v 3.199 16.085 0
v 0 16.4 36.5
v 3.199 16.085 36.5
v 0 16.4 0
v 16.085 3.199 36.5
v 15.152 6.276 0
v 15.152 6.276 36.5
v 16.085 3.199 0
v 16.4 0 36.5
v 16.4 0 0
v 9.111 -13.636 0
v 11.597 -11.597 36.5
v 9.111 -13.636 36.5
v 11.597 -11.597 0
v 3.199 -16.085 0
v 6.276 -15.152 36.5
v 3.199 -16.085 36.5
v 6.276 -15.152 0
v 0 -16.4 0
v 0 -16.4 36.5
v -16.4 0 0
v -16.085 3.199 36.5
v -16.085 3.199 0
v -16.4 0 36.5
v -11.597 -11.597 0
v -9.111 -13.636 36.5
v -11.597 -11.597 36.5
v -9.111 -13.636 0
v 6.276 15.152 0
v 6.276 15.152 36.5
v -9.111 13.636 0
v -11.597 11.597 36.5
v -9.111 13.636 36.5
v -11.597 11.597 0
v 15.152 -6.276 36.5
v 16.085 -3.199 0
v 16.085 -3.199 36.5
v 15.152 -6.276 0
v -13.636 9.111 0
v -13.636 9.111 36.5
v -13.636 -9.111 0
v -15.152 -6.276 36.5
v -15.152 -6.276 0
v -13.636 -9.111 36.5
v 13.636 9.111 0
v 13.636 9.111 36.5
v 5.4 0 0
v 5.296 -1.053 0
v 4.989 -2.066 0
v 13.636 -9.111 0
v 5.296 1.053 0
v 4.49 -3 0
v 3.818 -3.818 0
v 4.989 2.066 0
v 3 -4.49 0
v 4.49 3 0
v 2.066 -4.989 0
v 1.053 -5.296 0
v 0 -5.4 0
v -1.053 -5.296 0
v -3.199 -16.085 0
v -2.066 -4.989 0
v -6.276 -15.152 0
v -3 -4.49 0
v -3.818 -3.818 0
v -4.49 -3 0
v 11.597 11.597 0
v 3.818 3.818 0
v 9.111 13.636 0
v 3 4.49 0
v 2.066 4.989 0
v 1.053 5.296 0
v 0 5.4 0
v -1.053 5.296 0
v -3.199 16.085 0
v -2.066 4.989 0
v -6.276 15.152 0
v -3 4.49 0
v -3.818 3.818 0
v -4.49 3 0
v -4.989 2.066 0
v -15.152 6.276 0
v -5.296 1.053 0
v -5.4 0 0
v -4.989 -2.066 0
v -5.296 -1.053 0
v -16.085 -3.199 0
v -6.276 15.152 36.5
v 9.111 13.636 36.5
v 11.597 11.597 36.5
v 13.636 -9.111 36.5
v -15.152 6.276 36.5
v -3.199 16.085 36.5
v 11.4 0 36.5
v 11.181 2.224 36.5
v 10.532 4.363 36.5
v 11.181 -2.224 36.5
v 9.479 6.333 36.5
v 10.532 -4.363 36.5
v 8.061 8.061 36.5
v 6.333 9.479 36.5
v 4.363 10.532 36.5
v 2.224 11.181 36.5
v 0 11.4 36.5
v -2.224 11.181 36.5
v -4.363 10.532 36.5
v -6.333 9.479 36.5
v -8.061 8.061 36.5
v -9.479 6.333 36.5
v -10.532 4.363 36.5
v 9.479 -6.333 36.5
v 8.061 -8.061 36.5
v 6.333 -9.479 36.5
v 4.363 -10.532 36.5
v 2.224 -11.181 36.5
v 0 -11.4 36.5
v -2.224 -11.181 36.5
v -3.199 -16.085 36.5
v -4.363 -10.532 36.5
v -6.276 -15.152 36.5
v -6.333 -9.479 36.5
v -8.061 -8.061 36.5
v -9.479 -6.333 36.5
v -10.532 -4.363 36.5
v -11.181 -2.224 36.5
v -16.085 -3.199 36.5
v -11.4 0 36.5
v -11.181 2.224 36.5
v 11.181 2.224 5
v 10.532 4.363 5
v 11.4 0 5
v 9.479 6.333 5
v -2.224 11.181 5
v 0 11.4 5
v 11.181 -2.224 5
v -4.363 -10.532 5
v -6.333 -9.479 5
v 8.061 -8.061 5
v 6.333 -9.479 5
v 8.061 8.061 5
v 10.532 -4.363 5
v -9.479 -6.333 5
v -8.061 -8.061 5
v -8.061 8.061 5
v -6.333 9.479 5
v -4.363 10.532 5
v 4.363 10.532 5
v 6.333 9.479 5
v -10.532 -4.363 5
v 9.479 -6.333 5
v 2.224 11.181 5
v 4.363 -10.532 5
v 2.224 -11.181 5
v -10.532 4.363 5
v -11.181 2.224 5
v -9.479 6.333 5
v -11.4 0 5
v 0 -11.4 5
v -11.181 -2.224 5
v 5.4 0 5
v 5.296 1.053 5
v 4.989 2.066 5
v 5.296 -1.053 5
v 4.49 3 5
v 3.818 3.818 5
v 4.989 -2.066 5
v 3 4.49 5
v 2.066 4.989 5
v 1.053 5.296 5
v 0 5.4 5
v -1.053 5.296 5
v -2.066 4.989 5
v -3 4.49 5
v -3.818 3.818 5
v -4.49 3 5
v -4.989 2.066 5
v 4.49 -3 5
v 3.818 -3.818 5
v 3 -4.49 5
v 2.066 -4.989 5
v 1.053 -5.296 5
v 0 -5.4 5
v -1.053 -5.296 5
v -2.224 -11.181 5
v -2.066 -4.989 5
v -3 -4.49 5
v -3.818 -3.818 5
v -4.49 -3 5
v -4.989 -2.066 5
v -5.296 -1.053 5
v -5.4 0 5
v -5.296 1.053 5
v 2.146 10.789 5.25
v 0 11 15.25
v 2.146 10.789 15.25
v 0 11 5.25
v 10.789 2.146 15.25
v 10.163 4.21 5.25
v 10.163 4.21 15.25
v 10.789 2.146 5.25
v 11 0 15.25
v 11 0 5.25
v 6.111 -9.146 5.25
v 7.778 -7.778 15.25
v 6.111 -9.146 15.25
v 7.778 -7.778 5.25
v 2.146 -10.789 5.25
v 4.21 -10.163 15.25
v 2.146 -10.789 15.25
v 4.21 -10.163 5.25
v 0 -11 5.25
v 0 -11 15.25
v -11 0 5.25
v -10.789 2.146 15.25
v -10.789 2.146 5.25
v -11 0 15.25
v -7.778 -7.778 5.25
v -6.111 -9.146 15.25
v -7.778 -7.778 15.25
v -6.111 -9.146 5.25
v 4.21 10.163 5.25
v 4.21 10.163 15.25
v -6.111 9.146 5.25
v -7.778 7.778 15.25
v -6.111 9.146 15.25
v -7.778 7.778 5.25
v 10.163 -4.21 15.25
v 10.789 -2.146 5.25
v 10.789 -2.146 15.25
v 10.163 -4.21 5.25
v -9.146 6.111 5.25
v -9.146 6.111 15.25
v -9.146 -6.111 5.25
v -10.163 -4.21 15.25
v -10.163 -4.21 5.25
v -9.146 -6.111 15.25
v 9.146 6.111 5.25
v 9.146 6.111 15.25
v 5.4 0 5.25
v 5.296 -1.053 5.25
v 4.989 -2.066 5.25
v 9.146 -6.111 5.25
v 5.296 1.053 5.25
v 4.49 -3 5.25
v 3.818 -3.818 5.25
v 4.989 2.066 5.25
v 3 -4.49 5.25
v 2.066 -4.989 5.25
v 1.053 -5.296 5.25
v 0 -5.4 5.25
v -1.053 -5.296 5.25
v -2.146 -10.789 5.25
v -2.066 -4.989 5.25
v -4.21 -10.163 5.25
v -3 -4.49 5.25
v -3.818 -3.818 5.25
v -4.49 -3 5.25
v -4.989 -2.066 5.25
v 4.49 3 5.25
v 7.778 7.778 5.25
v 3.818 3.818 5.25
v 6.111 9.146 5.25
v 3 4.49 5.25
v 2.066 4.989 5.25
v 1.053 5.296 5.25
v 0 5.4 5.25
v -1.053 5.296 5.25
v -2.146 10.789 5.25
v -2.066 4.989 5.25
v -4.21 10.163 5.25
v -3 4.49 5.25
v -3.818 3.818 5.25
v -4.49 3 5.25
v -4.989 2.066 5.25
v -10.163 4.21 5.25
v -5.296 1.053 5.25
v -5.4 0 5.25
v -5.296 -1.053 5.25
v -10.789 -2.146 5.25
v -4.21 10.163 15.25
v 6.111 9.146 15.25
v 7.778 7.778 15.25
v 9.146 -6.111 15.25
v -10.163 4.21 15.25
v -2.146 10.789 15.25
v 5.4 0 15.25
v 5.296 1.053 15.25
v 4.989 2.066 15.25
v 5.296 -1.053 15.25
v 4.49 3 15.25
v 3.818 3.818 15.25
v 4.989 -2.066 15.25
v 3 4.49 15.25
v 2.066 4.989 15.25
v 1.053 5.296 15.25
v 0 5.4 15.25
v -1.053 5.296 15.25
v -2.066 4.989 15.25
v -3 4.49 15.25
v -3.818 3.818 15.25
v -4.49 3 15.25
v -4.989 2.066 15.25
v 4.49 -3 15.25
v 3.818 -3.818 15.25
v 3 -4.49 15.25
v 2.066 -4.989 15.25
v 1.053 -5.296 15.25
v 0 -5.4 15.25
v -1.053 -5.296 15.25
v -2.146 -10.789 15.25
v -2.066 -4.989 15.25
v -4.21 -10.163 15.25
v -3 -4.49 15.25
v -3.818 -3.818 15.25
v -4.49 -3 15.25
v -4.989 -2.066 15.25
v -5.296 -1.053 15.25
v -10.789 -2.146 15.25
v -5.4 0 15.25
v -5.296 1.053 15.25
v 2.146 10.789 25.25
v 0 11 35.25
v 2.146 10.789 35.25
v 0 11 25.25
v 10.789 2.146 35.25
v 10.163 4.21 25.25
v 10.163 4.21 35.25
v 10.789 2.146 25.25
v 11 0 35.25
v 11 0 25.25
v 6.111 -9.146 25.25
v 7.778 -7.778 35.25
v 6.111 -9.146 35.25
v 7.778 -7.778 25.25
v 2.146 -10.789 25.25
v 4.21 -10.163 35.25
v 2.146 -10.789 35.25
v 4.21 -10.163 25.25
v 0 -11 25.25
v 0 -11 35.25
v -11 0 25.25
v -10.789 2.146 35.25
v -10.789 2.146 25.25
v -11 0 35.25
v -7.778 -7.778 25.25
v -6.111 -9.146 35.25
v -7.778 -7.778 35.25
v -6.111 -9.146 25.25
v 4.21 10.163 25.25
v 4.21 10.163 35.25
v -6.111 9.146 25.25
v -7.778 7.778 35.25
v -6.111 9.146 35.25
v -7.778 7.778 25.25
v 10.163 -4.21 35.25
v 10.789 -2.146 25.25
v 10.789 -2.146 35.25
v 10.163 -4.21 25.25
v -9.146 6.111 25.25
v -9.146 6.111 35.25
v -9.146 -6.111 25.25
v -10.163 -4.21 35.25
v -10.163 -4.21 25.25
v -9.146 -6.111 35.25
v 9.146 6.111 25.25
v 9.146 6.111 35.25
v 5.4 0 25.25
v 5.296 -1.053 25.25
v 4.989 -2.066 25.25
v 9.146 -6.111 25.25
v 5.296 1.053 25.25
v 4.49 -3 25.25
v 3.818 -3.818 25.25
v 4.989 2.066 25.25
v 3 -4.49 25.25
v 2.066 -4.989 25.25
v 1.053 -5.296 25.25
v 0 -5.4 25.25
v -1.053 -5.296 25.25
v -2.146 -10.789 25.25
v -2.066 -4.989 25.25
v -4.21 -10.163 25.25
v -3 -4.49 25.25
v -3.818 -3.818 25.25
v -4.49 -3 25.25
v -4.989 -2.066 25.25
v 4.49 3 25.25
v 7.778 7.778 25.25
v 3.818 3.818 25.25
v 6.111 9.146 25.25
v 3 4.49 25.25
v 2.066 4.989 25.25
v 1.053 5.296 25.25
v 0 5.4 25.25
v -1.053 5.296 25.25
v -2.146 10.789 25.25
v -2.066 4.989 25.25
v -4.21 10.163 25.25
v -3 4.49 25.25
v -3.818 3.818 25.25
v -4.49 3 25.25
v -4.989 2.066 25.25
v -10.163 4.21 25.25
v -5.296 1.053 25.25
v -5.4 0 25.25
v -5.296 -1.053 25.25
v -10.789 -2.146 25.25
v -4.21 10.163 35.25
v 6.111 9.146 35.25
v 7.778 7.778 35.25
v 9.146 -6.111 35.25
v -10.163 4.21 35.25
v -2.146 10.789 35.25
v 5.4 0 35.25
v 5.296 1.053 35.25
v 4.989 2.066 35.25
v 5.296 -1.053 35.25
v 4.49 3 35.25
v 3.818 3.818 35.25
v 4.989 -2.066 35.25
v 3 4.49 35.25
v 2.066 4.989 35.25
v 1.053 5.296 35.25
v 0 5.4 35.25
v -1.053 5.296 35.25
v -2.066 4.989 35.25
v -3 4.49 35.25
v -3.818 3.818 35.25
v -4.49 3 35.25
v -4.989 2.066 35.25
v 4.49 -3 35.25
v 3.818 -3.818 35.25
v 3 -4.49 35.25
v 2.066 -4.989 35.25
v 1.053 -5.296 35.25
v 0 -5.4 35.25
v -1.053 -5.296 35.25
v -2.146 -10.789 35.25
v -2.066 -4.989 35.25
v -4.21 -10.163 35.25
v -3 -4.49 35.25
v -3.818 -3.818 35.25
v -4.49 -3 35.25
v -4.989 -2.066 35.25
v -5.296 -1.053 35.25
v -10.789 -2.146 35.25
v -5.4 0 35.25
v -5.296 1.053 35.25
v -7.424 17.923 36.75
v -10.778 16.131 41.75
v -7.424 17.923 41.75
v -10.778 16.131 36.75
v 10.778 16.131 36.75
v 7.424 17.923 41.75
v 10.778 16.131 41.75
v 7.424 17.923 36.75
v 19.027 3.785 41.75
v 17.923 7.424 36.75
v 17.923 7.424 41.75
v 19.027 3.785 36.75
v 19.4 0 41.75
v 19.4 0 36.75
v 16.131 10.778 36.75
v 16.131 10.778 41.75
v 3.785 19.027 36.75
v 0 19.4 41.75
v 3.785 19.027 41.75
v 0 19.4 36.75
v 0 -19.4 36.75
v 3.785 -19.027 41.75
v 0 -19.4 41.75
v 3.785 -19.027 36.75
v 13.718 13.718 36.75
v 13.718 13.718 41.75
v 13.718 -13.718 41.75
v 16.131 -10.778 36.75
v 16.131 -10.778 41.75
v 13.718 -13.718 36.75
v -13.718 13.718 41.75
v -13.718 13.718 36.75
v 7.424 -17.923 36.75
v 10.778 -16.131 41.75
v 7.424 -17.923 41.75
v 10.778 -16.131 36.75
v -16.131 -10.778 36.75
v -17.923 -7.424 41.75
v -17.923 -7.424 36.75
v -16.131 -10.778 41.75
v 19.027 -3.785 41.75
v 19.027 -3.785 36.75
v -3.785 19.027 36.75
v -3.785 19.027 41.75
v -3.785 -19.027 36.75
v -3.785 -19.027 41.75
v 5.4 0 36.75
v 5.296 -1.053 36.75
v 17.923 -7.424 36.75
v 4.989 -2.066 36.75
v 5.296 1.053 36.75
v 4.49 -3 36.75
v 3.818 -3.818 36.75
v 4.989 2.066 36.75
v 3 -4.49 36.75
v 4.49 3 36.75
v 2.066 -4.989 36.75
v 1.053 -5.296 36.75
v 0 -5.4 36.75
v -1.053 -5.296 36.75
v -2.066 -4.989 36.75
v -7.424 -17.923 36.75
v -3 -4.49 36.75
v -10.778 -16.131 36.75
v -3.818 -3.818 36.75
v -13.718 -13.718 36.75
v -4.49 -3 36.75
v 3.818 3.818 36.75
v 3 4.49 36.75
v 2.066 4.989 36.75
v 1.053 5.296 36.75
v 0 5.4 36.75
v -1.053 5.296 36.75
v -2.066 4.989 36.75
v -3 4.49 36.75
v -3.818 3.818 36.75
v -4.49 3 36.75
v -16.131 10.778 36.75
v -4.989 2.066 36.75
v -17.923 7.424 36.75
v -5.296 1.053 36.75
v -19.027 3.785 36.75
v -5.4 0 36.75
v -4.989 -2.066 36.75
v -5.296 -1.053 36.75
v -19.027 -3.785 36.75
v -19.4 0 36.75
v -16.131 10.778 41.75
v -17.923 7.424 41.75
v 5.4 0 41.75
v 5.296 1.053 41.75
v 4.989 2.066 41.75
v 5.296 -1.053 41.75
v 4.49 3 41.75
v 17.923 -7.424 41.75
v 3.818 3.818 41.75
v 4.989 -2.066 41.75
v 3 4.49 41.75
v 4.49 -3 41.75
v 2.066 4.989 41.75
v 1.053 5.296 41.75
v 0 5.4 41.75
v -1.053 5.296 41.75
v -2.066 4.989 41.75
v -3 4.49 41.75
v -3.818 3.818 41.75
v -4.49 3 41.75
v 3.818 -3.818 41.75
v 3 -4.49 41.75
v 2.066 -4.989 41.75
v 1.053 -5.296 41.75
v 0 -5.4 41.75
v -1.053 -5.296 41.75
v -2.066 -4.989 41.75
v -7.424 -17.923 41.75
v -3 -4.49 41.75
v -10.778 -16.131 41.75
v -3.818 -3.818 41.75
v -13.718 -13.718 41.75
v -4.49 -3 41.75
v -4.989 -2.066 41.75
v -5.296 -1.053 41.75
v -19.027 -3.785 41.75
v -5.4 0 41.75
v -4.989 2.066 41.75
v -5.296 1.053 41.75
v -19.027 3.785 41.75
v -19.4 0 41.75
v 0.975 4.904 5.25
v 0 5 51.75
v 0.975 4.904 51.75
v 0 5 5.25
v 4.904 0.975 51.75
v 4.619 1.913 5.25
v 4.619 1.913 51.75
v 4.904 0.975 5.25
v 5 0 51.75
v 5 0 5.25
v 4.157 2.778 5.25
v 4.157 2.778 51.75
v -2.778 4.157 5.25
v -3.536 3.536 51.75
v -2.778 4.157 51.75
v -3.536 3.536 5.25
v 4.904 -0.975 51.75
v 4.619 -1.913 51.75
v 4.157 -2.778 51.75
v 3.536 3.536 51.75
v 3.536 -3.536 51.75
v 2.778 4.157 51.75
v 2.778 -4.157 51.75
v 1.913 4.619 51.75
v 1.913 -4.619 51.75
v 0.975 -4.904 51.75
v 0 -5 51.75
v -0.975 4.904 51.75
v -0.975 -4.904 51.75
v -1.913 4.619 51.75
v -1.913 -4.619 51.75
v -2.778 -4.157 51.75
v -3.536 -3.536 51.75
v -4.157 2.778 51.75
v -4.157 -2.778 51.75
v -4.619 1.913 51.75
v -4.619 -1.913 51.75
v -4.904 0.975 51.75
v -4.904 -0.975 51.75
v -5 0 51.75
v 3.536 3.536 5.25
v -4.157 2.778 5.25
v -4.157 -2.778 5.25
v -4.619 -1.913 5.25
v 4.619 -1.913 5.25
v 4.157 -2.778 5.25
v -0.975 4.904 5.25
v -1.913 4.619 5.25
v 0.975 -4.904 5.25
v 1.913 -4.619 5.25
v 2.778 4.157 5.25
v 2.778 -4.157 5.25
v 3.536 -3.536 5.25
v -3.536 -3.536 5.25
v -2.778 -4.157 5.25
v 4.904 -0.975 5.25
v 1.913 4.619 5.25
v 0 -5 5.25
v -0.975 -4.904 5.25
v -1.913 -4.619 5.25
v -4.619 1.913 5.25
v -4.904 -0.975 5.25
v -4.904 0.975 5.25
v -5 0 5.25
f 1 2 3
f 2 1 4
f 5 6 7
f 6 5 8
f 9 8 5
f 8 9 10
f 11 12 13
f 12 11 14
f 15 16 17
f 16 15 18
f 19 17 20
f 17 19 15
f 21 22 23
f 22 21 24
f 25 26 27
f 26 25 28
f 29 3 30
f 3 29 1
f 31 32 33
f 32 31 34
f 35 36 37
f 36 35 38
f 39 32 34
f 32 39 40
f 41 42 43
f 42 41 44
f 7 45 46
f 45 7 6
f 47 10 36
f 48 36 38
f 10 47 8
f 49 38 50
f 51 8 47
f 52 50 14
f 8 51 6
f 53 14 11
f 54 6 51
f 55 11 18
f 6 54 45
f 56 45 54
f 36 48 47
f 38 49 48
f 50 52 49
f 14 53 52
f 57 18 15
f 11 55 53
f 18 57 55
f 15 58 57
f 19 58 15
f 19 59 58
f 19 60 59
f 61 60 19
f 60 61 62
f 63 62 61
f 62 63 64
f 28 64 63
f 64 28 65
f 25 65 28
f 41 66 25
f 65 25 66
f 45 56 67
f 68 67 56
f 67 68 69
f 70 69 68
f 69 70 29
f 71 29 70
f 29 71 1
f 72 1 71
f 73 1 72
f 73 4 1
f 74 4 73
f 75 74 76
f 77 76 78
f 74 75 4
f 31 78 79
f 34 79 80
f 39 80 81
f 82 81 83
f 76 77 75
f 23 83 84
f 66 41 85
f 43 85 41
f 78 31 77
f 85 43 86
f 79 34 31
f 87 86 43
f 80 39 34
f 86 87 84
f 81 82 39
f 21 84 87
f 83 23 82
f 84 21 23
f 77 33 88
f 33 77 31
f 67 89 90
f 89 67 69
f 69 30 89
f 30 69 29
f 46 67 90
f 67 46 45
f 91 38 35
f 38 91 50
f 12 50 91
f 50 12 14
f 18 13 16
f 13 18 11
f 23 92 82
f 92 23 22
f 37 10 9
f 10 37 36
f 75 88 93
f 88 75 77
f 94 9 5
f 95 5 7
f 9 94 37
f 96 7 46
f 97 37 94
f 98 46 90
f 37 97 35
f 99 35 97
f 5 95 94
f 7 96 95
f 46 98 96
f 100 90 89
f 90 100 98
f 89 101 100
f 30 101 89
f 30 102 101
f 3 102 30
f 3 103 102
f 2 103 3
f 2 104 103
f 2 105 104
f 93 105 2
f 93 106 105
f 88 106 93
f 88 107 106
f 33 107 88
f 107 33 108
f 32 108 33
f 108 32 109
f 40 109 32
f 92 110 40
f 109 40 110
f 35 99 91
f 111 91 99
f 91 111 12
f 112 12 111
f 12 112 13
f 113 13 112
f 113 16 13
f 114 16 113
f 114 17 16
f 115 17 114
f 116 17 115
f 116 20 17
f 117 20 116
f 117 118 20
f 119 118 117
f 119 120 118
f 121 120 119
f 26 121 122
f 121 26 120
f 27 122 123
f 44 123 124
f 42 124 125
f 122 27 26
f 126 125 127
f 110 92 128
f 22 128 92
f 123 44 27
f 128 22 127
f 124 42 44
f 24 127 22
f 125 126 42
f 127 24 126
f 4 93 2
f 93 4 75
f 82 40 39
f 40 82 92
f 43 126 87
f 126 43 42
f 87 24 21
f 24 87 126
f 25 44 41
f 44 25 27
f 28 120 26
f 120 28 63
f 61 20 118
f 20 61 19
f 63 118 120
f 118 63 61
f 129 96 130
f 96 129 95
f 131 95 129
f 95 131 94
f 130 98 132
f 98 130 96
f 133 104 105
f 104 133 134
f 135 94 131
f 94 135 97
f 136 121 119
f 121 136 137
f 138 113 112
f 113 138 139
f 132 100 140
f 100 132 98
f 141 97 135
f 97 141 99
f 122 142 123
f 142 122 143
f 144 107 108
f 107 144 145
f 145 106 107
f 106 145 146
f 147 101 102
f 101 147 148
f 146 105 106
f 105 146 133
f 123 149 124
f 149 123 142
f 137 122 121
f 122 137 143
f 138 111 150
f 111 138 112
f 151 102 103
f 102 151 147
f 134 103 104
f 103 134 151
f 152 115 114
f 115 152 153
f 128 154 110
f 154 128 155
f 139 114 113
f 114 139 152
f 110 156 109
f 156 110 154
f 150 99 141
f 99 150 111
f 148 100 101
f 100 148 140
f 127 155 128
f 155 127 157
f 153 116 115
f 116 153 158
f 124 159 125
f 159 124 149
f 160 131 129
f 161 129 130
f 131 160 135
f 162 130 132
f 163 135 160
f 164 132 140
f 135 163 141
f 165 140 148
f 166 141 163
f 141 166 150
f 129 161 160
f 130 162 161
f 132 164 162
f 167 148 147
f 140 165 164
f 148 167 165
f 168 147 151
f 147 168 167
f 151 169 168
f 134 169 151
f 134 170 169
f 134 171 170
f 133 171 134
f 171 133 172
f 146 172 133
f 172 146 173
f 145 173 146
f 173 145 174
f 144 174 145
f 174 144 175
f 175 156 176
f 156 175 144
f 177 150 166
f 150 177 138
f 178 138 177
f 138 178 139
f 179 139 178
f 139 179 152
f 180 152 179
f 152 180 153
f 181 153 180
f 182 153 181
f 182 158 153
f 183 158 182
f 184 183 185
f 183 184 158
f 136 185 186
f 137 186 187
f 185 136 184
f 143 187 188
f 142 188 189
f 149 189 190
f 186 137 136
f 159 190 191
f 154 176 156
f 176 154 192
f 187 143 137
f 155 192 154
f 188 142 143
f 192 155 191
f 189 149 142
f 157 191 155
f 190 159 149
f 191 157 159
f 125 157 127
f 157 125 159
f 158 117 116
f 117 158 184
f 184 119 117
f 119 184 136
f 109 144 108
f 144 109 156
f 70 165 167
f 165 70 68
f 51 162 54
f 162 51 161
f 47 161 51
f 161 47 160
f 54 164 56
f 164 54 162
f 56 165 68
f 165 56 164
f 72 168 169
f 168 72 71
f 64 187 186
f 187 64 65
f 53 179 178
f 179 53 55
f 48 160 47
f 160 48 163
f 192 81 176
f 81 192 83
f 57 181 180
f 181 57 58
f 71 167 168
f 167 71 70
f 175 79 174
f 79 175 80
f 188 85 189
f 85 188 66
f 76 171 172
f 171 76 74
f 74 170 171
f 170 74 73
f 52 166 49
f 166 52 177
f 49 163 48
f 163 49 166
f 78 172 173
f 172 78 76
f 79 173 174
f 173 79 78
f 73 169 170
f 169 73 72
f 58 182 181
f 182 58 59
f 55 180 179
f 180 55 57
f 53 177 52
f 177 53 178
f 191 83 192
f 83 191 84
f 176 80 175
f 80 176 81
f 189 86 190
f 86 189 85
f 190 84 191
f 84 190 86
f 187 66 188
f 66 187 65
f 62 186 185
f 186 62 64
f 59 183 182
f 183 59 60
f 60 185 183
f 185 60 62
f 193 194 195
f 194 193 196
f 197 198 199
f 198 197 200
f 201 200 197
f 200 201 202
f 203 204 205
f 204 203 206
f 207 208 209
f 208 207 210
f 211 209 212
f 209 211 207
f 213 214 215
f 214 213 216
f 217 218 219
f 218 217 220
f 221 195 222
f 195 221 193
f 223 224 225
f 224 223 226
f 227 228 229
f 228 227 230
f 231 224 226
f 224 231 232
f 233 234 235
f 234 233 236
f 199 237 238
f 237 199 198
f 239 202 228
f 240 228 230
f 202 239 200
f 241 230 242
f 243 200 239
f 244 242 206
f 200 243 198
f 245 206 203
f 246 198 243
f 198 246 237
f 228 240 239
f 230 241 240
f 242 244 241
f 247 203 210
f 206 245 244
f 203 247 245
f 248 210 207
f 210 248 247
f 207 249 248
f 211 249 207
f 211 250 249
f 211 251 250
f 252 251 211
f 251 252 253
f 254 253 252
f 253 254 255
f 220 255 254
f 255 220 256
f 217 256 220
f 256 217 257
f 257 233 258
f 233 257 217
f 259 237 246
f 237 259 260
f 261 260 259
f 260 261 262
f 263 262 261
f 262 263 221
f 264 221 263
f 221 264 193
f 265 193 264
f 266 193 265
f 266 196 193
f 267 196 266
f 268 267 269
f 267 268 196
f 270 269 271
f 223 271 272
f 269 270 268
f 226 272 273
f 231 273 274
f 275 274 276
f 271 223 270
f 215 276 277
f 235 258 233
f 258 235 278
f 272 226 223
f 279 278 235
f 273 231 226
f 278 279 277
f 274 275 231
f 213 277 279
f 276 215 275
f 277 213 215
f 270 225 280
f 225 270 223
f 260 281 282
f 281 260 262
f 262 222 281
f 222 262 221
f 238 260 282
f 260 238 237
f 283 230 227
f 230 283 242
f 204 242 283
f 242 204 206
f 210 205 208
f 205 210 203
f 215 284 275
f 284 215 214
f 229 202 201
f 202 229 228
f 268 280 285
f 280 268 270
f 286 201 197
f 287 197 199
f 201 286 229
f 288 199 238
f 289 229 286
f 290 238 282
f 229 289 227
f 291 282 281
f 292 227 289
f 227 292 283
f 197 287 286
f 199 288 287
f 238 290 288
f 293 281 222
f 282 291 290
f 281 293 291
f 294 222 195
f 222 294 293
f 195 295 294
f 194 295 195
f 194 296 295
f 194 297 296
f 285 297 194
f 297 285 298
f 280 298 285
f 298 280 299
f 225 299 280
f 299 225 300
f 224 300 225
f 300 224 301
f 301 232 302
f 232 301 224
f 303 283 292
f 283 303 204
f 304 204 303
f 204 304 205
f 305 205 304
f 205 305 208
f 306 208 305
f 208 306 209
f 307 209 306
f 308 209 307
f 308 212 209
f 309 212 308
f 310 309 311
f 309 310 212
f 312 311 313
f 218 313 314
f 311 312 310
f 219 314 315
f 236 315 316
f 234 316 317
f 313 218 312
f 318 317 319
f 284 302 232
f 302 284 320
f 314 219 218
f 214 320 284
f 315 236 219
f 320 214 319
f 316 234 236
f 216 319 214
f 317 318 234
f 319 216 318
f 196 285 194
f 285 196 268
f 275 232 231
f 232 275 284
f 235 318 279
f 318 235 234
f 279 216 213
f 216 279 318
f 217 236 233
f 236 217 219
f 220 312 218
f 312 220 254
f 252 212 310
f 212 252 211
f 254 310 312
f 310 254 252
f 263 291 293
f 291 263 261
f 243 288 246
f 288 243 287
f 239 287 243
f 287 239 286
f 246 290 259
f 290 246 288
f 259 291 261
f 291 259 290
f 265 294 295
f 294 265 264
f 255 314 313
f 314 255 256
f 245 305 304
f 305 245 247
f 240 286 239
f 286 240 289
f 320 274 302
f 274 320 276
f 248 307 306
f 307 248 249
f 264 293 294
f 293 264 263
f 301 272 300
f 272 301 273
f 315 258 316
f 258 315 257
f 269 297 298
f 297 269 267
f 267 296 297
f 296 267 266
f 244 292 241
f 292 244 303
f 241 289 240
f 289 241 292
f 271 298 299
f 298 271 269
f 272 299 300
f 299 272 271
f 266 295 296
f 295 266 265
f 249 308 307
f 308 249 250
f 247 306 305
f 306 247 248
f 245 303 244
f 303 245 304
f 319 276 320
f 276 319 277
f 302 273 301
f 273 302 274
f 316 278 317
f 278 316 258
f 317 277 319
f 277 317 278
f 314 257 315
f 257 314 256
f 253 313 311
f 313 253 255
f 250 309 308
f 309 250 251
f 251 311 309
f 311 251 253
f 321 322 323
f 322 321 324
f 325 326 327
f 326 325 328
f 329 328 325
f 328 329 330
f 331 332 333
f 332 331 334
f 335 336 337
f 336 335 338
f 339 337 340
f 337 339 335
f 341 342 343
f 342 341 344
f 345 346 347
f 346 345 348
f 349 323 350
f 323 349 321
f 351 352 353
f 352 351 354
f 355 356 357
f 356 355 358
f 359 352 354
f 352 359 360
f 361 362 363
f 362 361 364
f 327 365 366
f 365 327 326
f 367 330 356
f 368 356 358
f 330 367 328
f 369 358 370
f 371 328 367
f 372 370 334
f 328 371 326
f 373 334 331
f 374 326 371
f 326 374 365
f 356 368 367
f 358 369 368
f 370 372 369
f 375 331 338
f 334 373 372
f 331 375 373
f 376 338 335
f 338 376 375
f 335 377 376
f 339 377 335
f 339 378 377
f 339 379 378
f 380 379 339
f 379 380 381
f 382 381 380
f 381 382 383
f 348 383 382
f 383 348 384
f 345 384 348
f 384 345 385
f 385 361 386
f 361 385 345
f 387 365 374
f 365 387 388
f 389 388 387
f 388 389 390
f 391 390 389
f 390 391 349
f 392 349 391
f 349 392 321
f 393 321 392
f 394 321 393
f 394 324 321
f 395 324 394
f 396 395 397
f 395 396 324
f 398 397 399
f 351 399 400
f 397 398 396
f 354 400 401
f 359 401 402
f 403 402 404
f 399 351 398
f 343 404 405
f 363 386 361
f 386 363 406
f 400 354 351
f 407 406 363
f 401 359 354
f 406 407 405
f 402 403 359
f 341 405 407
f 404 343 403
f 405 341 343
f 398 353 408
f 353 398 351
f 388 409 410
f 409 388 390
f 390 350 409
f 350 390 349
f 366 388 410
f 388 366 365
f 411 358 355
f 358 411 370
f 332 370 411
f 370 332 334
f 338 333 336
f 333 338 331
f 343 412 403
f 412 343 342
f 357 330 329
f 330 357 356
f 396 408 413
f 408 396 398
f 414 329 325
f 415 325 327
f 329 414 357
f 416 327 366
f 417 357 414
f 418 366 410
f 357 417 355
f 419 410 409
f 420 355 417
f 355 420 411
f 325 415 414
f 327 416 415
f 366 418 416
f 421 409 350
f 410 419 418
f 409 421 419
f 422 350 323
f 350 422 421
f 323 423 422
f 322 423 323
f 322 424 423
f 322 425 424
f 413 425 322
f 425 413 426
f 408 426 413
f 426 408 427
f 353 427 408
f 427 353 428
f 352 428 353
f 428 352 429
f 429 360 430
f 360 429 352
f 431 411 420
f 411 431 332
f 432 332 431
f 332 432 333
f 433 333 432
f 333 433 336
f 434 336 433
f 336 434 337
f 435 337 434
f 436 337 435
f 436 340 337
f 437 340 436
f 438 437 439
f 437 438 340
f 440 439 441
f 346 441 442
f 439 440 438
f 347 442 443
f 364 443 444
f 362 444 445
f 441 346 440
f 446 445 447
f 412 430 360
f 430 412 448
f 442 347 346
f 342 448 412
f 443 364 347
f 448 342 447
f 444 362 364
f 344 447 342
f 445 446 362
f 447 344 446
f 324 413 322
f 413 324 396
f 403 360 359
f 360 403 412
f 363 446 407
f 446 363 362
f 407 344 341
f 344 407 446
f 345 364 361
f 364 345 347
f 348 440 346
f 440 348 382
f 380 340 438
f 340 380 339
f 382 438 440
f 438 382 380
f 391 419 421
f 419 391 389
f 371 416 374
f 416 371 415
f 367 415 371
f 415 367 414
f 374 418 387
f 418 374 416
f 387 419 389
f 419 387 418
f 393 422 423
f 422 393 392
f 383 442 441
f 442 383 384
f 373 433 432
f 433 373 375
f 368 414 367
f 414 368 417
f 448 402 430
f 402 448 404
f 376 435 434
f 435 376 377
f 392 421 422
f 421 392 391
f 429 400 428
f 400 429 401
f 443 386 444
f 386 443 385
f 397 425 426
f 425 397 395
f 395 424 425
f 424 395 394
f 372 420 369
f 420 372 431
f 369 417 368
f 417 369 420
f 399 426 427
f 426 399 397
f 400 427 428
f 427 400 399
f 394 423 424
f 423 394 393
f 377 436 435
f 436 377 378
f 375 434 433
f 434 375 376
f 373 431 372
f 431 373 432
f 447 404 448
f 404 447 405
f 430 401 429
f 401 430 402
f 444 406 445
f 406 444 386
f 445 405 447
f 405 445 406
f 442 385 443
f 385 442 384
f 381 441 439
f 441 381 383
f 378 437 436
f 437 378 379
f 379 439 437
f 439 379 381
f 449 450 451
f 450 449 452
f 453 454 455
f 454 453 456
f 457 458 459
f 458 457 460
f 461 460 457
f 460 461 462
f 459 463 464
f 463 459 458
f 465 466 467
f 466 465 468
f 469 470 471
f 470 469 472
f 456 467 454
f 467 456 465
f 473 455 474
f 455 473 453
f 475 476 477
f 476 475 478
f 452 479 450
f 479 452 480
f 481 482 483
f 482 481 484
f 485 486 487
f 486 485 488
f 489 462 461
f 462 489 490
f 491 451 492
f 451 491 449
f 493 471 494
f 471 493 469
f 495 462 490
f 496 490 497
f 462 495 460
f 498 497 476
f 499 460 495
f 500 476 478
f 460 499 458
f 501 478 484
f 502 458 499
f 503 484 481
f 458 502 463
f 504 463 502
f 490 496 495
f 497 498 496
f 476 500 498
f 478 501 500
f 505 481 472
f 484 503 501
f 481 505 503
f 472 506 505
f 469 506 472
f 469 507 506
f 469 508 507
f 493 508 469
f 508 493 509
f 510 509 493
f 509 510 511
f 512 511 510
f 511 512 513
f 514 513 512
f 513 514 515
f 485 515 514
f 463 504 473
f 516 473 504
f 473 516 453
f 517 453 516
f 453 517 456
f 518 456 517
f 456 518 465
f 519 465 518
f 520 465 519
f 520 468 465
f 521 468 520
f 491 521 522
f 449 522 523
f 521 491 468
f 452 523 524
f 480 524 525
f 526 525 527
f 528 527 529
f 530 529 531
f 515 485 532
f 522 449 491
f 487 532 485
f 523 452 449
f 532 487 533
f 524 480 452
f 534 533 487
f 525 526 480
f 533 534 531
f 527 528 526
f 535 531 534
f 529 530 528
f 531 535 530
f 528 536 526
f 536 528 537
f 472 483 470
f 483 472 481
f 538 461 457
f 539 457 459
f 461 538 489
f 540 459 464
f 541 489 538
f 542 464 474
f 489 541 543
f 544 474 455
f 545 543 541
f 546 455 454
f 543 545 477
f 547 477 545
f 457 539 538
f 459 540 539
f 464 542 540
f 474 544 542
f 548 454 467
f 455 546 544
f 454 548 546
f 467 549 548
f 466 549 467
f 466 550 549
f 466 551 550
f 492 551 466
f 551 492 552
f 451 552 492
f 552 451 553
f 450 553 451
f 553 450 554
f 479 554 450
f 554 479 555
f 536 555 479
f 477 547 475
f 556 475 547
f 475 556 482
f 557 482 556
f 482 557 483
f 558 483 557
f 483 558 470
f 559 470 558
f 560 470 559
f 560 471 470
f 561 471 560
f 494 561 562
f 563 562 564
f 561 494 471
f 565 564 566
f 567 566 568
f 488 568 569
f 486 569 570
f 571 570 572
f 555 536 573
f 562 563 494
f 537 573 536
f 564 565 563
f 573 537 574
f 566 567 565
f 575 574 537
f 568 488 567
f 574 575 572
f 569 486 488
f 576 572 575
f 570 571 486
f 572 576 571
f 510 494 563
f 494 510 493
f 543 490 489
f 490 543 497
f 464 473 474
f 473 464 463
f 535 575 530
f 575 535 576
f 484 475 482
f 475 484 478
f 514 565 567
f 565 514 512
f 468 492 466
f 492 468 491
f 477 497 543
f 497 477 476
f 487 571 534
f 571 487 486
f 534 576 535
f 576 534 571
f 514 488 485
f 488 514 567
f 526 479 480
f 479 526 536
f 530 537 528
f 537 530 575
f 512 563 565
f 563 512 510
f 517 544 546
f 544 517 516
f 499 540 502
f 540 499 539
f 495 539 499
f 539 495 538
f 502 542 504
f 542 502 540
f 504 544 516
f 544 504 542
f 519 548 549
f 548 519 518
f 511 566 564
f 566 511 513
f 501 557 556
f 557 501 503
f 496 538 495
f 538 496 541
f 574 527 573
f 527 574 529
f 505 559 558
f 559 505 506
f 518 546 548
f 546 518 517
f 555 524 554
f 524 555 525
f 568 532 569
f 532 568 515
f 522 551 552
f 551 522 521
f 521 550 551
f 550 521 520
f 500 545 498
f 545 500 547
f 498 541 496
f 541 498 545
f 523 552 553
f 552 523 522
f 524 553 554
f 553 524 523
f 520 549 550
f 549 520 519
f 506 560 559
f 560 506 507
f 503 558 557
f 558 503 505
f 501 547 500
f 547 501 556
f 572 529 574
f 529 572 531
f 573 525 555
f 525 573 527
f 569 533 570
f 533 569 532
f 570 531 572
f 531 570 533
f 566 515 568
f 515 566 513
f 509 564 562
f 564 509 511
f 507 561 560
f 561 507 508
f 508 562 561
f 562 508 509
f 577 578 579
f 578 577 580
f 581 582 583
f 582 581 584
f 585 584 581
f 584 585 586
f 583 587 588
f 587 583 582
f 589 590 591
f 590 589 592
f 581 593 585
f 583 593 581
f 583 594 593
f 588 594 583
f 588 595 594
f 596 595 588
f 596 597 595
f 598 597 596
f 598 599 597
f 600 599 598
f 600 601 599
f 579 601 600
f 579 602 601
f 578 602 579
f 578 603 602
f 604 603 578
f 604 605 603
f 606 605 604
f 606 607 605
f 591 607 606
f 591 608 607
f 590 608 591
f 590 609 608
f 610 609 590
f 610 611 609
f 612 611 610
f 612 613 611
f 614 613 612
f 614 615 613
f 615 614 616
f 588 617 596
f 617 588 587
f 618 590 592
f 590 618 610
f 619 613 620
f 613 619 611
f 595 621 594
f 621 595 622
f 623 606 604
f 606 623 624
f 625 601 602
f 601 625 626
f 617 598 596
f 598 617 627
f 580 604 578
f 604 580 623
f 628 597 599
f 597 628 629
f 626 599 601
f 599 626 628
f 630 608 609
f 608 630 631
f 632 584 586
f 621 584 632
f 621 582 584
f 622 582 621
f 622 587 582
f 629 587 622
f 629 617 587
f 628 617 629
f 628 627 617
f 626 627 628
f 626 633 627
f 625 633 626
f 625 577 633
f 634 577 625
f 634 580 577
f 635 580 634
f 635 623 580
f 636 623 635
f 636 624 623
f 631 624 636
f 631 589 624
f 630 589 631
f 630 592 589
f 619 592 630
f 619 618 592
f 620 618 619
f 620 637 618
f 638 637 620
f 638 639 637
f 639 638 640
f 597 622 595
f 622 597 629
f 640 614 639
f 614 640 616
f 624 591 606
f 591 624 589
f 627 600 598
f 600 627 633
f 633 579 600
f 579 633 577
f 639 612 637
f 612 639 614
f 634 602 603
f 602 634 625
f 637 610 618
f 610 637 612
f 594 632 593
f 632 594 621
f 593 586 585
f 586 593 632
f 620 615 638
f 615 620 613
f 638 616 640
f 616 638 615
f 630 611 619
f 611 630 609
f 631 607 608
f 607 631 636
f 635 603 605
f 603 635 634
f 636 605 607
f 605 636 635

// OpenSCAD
$fn = 32;

// ------------------------------------------------------------------------
// Shaft station: cup d32.8 x 36.5 mm, shaft d10
// Every part is its own module, assembly() places every instance.
// ------------------------------------------------------------------------

// --- part 1 ---
module housing_cup() {
  difference() {
    cylinder(h = 36.5, d = 32.8);
    translate([0, 0, 5]) cylinder(h = 32.5, d = 22.8);
    translate([0, 0, -1]) cylinder(h = 7, d = 10.8);
  }
}

// --- part 2 ---
module bearing_lower() {
  difference() {
      translate([0, 0, 0]) cylinder(h = 10, d = 22);
      translate([0, 0, -1]) cylinder(h = 12, d = 10.8);
    }
}

// --- part 3 ---
module bearing_upper() {
  difference() {
      translate([0, 0, 0]) cylinder(h = 10, d = 22);
      translate([0, 0, -1]) cylinder(h = 12, d = 10.8);
    }
}

// --- part 4 ---
module station_shaft() {
  translate([0, 0, -23.25]) cylinder(h = 46.5, d = 10);
}

// --- part 5 ---
module station_cover() {
  difference() {
    cylinder(h = 5, d = 38.8);
    translate([0, 0, -1]) cylinder(h = 7, d = 10.8);
  }
}

// --- assembly ---
module assembly() {
  color([0.80, 0.24, 0.20]) translate([0, 0, 0]) rotate([0, 0, 0]) housing_cup();
  color([0.20, 0.45, 0.75]) translate([0, 0, 5.25]) rotate([0, 0, 0]) bearing_lower();
  color([0.25, 0.62, 0.32]) translate([0, 0, 25.25]) rotate([0, 0, 0]) bearing_upper();
  color([0.92, 0.70, 0.18]) translate([0, 0, 28.5]) rotate([0, 0, 0]) station_shaft();
  color([0.58, 0.35, 0.70]) translate([0, 0, 36.75]) rotate([0, 0, 0]) station_cover();
}

assembly();
